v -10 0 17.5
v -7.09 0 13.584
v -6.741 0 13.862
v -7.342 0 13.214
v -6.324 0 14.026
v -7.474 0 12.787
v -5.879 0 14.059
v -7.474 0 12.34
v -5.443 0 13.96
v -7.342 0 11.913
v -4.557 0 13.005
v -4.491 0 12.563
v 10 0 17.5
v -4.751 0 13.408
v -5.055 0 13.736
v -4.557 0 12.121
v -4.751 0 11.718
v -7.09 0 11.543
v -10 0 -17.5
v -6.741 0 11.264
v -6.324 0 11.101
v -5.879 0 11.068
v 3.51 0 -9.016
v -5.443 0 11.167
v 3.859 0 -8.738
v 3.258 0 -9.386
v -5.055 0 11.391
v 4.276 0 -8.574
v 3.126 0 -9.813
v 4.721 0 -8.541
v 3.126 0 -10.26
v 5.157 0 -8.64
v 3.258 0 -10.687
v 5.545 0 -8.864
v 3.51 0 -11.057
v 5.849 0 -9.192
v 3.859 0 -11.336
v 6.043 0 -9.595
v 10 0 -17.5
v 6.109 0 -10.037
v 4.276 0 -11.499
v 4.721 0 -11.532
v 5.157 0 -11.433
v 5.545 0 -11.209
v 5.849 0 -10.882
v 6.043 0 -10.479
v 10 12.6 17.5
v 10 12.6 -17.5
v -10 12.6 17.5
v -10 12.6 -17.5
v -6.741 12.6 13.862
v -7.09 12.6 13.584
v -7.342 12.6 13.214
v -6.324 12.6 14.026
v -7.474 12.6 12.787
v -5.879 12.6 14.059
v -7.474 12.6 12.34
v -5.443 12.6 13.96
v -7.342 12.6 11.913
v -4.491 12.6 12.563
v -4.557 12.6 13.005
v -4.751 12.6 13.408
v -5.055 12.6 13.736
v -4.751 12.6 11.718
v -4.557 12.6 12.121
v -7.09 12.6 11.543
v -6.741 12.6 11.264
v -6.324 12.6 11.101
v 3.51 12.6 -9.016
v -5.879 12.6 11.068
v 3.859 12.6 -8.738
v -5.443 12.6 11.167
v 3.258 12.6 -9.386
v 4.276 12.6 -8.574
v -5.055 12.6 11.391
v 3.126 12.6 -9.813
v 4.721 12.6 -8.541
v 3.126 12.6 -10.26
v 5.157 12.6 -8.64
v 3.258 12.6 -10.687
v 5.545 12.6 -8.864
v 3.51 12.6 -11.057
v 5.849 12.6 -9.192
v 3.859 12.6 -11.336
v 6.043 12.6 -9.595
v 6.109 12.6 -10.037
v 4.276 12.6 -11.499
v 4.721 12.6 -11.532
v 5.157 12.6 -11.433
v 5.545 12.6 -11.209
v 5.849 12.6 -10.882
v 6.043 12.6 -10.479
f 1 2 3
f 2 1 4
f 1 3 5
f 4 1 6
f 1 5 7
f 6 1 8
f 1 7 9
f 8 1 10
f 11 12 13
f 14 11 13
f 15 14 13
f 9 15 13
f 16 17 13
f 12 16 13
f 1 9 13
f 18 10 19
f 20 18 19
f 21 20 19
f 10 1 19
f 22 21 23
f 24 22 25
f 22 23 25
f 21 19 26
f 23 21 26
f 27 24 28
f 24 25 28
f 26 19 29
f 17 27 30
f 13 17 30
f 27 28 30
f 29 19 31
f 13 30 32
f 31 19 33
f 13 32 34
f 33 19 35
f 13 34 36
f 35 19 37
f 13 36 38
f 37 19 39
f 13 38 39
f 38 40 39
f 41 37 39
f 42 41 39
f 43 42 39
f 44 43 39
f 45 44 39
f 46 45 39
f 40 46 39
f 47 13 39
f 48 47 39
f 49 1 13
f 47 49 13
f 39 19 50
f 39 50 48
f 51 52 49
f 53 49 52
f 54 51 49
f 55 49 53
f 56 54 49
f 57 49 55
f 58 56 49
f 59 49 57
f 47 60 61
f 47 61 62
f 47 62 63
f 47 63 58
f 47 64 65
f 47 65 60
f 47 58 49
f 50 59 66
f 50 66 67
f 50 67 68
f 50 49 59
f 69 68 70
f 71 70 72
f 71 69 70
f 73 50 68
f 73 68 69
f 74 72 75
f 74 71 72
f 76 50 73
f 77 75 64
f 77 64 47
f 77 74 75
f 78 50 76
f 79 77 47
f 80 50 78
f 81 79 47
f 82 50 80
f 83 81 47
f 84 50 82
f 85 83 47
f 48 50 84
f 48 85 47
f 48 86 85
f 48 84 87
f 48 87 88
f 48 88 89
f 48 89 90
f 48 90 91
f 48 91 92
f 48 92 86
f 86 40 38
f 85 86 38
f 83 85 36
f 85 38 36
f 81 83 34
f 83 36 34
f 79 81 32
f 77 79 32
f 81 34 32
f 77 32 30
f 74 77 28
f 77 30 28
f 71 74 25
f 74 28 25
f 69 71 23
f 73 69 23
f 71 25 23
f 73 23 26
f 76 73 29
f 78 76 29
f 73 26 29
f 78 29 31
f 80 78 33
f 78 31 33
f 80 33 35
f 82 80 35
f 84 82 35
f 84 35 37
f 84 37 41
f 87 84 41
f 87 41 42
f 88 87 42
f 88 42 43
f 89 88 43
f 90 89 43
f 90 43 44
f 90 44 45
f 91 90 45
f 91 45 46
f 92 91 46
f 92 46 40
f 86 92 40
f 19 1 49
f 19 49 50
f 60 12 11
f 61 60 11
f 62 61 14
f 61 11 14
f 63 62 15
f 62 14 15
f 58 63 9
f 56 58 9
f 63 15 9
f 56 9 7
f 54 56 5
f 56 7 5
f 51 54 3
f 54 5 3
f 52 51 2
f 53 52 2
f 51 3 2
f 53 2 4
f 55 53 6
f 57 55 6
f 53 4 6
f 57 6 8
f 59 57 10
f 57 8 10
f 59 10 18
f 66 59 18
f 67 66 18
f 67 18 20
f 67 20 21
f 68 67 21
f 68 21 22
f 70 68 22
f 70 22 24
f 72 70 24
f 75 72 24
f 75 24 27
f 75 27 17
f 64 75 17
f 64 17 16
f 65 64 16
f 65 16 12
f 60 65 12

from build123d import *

# Parameters (mm, degrees)
SKETCH1_W           = 20
SKETCH1_H           = 35
BOSS_EXTRUDE1_DEPTH = 12.6
CUT_EXTRUDE1_REACH  = 14.6
SKETCH2_R           = 1.5


with BuildPart() as part:
    # Sketch1 → Boss-Extrude1 (new body)
    with BuildSketch(Plane(origin=(0, 0, 0), x_dir=(1, 0, 0), z_dir=(0, 1, 0))):
        Rectangle(SKETCH1_W, SKETCH1_H)
    extrude(amount=BOSS_EXTRUDE1_DEPTH)

    # Sketch2 → Cut-Extrude1 (cut, up to next)
    with BuildSketch(Plane.XZ, mode=Mode.PRIVATE) as cut_extrude1_sk1:
        with Locations((-5.990644946, 12.563355097)):
            Circle(SKETCH2_R)
    cut_extrude1_tool1 = extrude(cut_extrude1_sk1.sketch, amount=-CUT_EXTRUDE1_REACH, mode=Mode.PRIVATE) & part.part
    add(cut_extrude1_tool1.solids().sort_by_distance((-5.990645, 0, 12.563355))[0], mode=Mode.SUBTRACT)
    # Sketch2 → Cut-Extrude1 (cut, up to next)
    with BuildSketch(Plane.XZ, mode=Mode.PRIVATE) as cut_extrude1_sk2:
        with Locations((4.609355054, -10.036644903)):
            Circle(SKETCH2_R)
    cut_extrude1_tool2 = extrude(cut_extrude1_sk2.sketch, amount=-CUT_EXTRUDE1_REACH, mode=Mode.PRIVATE) & part.part
    add(cut_extrude1_tool2.solids().sort_by_distance((4.609355, 0, -10.036645))[0], mode=Mode.SUBTRACT)


solid = part.part
